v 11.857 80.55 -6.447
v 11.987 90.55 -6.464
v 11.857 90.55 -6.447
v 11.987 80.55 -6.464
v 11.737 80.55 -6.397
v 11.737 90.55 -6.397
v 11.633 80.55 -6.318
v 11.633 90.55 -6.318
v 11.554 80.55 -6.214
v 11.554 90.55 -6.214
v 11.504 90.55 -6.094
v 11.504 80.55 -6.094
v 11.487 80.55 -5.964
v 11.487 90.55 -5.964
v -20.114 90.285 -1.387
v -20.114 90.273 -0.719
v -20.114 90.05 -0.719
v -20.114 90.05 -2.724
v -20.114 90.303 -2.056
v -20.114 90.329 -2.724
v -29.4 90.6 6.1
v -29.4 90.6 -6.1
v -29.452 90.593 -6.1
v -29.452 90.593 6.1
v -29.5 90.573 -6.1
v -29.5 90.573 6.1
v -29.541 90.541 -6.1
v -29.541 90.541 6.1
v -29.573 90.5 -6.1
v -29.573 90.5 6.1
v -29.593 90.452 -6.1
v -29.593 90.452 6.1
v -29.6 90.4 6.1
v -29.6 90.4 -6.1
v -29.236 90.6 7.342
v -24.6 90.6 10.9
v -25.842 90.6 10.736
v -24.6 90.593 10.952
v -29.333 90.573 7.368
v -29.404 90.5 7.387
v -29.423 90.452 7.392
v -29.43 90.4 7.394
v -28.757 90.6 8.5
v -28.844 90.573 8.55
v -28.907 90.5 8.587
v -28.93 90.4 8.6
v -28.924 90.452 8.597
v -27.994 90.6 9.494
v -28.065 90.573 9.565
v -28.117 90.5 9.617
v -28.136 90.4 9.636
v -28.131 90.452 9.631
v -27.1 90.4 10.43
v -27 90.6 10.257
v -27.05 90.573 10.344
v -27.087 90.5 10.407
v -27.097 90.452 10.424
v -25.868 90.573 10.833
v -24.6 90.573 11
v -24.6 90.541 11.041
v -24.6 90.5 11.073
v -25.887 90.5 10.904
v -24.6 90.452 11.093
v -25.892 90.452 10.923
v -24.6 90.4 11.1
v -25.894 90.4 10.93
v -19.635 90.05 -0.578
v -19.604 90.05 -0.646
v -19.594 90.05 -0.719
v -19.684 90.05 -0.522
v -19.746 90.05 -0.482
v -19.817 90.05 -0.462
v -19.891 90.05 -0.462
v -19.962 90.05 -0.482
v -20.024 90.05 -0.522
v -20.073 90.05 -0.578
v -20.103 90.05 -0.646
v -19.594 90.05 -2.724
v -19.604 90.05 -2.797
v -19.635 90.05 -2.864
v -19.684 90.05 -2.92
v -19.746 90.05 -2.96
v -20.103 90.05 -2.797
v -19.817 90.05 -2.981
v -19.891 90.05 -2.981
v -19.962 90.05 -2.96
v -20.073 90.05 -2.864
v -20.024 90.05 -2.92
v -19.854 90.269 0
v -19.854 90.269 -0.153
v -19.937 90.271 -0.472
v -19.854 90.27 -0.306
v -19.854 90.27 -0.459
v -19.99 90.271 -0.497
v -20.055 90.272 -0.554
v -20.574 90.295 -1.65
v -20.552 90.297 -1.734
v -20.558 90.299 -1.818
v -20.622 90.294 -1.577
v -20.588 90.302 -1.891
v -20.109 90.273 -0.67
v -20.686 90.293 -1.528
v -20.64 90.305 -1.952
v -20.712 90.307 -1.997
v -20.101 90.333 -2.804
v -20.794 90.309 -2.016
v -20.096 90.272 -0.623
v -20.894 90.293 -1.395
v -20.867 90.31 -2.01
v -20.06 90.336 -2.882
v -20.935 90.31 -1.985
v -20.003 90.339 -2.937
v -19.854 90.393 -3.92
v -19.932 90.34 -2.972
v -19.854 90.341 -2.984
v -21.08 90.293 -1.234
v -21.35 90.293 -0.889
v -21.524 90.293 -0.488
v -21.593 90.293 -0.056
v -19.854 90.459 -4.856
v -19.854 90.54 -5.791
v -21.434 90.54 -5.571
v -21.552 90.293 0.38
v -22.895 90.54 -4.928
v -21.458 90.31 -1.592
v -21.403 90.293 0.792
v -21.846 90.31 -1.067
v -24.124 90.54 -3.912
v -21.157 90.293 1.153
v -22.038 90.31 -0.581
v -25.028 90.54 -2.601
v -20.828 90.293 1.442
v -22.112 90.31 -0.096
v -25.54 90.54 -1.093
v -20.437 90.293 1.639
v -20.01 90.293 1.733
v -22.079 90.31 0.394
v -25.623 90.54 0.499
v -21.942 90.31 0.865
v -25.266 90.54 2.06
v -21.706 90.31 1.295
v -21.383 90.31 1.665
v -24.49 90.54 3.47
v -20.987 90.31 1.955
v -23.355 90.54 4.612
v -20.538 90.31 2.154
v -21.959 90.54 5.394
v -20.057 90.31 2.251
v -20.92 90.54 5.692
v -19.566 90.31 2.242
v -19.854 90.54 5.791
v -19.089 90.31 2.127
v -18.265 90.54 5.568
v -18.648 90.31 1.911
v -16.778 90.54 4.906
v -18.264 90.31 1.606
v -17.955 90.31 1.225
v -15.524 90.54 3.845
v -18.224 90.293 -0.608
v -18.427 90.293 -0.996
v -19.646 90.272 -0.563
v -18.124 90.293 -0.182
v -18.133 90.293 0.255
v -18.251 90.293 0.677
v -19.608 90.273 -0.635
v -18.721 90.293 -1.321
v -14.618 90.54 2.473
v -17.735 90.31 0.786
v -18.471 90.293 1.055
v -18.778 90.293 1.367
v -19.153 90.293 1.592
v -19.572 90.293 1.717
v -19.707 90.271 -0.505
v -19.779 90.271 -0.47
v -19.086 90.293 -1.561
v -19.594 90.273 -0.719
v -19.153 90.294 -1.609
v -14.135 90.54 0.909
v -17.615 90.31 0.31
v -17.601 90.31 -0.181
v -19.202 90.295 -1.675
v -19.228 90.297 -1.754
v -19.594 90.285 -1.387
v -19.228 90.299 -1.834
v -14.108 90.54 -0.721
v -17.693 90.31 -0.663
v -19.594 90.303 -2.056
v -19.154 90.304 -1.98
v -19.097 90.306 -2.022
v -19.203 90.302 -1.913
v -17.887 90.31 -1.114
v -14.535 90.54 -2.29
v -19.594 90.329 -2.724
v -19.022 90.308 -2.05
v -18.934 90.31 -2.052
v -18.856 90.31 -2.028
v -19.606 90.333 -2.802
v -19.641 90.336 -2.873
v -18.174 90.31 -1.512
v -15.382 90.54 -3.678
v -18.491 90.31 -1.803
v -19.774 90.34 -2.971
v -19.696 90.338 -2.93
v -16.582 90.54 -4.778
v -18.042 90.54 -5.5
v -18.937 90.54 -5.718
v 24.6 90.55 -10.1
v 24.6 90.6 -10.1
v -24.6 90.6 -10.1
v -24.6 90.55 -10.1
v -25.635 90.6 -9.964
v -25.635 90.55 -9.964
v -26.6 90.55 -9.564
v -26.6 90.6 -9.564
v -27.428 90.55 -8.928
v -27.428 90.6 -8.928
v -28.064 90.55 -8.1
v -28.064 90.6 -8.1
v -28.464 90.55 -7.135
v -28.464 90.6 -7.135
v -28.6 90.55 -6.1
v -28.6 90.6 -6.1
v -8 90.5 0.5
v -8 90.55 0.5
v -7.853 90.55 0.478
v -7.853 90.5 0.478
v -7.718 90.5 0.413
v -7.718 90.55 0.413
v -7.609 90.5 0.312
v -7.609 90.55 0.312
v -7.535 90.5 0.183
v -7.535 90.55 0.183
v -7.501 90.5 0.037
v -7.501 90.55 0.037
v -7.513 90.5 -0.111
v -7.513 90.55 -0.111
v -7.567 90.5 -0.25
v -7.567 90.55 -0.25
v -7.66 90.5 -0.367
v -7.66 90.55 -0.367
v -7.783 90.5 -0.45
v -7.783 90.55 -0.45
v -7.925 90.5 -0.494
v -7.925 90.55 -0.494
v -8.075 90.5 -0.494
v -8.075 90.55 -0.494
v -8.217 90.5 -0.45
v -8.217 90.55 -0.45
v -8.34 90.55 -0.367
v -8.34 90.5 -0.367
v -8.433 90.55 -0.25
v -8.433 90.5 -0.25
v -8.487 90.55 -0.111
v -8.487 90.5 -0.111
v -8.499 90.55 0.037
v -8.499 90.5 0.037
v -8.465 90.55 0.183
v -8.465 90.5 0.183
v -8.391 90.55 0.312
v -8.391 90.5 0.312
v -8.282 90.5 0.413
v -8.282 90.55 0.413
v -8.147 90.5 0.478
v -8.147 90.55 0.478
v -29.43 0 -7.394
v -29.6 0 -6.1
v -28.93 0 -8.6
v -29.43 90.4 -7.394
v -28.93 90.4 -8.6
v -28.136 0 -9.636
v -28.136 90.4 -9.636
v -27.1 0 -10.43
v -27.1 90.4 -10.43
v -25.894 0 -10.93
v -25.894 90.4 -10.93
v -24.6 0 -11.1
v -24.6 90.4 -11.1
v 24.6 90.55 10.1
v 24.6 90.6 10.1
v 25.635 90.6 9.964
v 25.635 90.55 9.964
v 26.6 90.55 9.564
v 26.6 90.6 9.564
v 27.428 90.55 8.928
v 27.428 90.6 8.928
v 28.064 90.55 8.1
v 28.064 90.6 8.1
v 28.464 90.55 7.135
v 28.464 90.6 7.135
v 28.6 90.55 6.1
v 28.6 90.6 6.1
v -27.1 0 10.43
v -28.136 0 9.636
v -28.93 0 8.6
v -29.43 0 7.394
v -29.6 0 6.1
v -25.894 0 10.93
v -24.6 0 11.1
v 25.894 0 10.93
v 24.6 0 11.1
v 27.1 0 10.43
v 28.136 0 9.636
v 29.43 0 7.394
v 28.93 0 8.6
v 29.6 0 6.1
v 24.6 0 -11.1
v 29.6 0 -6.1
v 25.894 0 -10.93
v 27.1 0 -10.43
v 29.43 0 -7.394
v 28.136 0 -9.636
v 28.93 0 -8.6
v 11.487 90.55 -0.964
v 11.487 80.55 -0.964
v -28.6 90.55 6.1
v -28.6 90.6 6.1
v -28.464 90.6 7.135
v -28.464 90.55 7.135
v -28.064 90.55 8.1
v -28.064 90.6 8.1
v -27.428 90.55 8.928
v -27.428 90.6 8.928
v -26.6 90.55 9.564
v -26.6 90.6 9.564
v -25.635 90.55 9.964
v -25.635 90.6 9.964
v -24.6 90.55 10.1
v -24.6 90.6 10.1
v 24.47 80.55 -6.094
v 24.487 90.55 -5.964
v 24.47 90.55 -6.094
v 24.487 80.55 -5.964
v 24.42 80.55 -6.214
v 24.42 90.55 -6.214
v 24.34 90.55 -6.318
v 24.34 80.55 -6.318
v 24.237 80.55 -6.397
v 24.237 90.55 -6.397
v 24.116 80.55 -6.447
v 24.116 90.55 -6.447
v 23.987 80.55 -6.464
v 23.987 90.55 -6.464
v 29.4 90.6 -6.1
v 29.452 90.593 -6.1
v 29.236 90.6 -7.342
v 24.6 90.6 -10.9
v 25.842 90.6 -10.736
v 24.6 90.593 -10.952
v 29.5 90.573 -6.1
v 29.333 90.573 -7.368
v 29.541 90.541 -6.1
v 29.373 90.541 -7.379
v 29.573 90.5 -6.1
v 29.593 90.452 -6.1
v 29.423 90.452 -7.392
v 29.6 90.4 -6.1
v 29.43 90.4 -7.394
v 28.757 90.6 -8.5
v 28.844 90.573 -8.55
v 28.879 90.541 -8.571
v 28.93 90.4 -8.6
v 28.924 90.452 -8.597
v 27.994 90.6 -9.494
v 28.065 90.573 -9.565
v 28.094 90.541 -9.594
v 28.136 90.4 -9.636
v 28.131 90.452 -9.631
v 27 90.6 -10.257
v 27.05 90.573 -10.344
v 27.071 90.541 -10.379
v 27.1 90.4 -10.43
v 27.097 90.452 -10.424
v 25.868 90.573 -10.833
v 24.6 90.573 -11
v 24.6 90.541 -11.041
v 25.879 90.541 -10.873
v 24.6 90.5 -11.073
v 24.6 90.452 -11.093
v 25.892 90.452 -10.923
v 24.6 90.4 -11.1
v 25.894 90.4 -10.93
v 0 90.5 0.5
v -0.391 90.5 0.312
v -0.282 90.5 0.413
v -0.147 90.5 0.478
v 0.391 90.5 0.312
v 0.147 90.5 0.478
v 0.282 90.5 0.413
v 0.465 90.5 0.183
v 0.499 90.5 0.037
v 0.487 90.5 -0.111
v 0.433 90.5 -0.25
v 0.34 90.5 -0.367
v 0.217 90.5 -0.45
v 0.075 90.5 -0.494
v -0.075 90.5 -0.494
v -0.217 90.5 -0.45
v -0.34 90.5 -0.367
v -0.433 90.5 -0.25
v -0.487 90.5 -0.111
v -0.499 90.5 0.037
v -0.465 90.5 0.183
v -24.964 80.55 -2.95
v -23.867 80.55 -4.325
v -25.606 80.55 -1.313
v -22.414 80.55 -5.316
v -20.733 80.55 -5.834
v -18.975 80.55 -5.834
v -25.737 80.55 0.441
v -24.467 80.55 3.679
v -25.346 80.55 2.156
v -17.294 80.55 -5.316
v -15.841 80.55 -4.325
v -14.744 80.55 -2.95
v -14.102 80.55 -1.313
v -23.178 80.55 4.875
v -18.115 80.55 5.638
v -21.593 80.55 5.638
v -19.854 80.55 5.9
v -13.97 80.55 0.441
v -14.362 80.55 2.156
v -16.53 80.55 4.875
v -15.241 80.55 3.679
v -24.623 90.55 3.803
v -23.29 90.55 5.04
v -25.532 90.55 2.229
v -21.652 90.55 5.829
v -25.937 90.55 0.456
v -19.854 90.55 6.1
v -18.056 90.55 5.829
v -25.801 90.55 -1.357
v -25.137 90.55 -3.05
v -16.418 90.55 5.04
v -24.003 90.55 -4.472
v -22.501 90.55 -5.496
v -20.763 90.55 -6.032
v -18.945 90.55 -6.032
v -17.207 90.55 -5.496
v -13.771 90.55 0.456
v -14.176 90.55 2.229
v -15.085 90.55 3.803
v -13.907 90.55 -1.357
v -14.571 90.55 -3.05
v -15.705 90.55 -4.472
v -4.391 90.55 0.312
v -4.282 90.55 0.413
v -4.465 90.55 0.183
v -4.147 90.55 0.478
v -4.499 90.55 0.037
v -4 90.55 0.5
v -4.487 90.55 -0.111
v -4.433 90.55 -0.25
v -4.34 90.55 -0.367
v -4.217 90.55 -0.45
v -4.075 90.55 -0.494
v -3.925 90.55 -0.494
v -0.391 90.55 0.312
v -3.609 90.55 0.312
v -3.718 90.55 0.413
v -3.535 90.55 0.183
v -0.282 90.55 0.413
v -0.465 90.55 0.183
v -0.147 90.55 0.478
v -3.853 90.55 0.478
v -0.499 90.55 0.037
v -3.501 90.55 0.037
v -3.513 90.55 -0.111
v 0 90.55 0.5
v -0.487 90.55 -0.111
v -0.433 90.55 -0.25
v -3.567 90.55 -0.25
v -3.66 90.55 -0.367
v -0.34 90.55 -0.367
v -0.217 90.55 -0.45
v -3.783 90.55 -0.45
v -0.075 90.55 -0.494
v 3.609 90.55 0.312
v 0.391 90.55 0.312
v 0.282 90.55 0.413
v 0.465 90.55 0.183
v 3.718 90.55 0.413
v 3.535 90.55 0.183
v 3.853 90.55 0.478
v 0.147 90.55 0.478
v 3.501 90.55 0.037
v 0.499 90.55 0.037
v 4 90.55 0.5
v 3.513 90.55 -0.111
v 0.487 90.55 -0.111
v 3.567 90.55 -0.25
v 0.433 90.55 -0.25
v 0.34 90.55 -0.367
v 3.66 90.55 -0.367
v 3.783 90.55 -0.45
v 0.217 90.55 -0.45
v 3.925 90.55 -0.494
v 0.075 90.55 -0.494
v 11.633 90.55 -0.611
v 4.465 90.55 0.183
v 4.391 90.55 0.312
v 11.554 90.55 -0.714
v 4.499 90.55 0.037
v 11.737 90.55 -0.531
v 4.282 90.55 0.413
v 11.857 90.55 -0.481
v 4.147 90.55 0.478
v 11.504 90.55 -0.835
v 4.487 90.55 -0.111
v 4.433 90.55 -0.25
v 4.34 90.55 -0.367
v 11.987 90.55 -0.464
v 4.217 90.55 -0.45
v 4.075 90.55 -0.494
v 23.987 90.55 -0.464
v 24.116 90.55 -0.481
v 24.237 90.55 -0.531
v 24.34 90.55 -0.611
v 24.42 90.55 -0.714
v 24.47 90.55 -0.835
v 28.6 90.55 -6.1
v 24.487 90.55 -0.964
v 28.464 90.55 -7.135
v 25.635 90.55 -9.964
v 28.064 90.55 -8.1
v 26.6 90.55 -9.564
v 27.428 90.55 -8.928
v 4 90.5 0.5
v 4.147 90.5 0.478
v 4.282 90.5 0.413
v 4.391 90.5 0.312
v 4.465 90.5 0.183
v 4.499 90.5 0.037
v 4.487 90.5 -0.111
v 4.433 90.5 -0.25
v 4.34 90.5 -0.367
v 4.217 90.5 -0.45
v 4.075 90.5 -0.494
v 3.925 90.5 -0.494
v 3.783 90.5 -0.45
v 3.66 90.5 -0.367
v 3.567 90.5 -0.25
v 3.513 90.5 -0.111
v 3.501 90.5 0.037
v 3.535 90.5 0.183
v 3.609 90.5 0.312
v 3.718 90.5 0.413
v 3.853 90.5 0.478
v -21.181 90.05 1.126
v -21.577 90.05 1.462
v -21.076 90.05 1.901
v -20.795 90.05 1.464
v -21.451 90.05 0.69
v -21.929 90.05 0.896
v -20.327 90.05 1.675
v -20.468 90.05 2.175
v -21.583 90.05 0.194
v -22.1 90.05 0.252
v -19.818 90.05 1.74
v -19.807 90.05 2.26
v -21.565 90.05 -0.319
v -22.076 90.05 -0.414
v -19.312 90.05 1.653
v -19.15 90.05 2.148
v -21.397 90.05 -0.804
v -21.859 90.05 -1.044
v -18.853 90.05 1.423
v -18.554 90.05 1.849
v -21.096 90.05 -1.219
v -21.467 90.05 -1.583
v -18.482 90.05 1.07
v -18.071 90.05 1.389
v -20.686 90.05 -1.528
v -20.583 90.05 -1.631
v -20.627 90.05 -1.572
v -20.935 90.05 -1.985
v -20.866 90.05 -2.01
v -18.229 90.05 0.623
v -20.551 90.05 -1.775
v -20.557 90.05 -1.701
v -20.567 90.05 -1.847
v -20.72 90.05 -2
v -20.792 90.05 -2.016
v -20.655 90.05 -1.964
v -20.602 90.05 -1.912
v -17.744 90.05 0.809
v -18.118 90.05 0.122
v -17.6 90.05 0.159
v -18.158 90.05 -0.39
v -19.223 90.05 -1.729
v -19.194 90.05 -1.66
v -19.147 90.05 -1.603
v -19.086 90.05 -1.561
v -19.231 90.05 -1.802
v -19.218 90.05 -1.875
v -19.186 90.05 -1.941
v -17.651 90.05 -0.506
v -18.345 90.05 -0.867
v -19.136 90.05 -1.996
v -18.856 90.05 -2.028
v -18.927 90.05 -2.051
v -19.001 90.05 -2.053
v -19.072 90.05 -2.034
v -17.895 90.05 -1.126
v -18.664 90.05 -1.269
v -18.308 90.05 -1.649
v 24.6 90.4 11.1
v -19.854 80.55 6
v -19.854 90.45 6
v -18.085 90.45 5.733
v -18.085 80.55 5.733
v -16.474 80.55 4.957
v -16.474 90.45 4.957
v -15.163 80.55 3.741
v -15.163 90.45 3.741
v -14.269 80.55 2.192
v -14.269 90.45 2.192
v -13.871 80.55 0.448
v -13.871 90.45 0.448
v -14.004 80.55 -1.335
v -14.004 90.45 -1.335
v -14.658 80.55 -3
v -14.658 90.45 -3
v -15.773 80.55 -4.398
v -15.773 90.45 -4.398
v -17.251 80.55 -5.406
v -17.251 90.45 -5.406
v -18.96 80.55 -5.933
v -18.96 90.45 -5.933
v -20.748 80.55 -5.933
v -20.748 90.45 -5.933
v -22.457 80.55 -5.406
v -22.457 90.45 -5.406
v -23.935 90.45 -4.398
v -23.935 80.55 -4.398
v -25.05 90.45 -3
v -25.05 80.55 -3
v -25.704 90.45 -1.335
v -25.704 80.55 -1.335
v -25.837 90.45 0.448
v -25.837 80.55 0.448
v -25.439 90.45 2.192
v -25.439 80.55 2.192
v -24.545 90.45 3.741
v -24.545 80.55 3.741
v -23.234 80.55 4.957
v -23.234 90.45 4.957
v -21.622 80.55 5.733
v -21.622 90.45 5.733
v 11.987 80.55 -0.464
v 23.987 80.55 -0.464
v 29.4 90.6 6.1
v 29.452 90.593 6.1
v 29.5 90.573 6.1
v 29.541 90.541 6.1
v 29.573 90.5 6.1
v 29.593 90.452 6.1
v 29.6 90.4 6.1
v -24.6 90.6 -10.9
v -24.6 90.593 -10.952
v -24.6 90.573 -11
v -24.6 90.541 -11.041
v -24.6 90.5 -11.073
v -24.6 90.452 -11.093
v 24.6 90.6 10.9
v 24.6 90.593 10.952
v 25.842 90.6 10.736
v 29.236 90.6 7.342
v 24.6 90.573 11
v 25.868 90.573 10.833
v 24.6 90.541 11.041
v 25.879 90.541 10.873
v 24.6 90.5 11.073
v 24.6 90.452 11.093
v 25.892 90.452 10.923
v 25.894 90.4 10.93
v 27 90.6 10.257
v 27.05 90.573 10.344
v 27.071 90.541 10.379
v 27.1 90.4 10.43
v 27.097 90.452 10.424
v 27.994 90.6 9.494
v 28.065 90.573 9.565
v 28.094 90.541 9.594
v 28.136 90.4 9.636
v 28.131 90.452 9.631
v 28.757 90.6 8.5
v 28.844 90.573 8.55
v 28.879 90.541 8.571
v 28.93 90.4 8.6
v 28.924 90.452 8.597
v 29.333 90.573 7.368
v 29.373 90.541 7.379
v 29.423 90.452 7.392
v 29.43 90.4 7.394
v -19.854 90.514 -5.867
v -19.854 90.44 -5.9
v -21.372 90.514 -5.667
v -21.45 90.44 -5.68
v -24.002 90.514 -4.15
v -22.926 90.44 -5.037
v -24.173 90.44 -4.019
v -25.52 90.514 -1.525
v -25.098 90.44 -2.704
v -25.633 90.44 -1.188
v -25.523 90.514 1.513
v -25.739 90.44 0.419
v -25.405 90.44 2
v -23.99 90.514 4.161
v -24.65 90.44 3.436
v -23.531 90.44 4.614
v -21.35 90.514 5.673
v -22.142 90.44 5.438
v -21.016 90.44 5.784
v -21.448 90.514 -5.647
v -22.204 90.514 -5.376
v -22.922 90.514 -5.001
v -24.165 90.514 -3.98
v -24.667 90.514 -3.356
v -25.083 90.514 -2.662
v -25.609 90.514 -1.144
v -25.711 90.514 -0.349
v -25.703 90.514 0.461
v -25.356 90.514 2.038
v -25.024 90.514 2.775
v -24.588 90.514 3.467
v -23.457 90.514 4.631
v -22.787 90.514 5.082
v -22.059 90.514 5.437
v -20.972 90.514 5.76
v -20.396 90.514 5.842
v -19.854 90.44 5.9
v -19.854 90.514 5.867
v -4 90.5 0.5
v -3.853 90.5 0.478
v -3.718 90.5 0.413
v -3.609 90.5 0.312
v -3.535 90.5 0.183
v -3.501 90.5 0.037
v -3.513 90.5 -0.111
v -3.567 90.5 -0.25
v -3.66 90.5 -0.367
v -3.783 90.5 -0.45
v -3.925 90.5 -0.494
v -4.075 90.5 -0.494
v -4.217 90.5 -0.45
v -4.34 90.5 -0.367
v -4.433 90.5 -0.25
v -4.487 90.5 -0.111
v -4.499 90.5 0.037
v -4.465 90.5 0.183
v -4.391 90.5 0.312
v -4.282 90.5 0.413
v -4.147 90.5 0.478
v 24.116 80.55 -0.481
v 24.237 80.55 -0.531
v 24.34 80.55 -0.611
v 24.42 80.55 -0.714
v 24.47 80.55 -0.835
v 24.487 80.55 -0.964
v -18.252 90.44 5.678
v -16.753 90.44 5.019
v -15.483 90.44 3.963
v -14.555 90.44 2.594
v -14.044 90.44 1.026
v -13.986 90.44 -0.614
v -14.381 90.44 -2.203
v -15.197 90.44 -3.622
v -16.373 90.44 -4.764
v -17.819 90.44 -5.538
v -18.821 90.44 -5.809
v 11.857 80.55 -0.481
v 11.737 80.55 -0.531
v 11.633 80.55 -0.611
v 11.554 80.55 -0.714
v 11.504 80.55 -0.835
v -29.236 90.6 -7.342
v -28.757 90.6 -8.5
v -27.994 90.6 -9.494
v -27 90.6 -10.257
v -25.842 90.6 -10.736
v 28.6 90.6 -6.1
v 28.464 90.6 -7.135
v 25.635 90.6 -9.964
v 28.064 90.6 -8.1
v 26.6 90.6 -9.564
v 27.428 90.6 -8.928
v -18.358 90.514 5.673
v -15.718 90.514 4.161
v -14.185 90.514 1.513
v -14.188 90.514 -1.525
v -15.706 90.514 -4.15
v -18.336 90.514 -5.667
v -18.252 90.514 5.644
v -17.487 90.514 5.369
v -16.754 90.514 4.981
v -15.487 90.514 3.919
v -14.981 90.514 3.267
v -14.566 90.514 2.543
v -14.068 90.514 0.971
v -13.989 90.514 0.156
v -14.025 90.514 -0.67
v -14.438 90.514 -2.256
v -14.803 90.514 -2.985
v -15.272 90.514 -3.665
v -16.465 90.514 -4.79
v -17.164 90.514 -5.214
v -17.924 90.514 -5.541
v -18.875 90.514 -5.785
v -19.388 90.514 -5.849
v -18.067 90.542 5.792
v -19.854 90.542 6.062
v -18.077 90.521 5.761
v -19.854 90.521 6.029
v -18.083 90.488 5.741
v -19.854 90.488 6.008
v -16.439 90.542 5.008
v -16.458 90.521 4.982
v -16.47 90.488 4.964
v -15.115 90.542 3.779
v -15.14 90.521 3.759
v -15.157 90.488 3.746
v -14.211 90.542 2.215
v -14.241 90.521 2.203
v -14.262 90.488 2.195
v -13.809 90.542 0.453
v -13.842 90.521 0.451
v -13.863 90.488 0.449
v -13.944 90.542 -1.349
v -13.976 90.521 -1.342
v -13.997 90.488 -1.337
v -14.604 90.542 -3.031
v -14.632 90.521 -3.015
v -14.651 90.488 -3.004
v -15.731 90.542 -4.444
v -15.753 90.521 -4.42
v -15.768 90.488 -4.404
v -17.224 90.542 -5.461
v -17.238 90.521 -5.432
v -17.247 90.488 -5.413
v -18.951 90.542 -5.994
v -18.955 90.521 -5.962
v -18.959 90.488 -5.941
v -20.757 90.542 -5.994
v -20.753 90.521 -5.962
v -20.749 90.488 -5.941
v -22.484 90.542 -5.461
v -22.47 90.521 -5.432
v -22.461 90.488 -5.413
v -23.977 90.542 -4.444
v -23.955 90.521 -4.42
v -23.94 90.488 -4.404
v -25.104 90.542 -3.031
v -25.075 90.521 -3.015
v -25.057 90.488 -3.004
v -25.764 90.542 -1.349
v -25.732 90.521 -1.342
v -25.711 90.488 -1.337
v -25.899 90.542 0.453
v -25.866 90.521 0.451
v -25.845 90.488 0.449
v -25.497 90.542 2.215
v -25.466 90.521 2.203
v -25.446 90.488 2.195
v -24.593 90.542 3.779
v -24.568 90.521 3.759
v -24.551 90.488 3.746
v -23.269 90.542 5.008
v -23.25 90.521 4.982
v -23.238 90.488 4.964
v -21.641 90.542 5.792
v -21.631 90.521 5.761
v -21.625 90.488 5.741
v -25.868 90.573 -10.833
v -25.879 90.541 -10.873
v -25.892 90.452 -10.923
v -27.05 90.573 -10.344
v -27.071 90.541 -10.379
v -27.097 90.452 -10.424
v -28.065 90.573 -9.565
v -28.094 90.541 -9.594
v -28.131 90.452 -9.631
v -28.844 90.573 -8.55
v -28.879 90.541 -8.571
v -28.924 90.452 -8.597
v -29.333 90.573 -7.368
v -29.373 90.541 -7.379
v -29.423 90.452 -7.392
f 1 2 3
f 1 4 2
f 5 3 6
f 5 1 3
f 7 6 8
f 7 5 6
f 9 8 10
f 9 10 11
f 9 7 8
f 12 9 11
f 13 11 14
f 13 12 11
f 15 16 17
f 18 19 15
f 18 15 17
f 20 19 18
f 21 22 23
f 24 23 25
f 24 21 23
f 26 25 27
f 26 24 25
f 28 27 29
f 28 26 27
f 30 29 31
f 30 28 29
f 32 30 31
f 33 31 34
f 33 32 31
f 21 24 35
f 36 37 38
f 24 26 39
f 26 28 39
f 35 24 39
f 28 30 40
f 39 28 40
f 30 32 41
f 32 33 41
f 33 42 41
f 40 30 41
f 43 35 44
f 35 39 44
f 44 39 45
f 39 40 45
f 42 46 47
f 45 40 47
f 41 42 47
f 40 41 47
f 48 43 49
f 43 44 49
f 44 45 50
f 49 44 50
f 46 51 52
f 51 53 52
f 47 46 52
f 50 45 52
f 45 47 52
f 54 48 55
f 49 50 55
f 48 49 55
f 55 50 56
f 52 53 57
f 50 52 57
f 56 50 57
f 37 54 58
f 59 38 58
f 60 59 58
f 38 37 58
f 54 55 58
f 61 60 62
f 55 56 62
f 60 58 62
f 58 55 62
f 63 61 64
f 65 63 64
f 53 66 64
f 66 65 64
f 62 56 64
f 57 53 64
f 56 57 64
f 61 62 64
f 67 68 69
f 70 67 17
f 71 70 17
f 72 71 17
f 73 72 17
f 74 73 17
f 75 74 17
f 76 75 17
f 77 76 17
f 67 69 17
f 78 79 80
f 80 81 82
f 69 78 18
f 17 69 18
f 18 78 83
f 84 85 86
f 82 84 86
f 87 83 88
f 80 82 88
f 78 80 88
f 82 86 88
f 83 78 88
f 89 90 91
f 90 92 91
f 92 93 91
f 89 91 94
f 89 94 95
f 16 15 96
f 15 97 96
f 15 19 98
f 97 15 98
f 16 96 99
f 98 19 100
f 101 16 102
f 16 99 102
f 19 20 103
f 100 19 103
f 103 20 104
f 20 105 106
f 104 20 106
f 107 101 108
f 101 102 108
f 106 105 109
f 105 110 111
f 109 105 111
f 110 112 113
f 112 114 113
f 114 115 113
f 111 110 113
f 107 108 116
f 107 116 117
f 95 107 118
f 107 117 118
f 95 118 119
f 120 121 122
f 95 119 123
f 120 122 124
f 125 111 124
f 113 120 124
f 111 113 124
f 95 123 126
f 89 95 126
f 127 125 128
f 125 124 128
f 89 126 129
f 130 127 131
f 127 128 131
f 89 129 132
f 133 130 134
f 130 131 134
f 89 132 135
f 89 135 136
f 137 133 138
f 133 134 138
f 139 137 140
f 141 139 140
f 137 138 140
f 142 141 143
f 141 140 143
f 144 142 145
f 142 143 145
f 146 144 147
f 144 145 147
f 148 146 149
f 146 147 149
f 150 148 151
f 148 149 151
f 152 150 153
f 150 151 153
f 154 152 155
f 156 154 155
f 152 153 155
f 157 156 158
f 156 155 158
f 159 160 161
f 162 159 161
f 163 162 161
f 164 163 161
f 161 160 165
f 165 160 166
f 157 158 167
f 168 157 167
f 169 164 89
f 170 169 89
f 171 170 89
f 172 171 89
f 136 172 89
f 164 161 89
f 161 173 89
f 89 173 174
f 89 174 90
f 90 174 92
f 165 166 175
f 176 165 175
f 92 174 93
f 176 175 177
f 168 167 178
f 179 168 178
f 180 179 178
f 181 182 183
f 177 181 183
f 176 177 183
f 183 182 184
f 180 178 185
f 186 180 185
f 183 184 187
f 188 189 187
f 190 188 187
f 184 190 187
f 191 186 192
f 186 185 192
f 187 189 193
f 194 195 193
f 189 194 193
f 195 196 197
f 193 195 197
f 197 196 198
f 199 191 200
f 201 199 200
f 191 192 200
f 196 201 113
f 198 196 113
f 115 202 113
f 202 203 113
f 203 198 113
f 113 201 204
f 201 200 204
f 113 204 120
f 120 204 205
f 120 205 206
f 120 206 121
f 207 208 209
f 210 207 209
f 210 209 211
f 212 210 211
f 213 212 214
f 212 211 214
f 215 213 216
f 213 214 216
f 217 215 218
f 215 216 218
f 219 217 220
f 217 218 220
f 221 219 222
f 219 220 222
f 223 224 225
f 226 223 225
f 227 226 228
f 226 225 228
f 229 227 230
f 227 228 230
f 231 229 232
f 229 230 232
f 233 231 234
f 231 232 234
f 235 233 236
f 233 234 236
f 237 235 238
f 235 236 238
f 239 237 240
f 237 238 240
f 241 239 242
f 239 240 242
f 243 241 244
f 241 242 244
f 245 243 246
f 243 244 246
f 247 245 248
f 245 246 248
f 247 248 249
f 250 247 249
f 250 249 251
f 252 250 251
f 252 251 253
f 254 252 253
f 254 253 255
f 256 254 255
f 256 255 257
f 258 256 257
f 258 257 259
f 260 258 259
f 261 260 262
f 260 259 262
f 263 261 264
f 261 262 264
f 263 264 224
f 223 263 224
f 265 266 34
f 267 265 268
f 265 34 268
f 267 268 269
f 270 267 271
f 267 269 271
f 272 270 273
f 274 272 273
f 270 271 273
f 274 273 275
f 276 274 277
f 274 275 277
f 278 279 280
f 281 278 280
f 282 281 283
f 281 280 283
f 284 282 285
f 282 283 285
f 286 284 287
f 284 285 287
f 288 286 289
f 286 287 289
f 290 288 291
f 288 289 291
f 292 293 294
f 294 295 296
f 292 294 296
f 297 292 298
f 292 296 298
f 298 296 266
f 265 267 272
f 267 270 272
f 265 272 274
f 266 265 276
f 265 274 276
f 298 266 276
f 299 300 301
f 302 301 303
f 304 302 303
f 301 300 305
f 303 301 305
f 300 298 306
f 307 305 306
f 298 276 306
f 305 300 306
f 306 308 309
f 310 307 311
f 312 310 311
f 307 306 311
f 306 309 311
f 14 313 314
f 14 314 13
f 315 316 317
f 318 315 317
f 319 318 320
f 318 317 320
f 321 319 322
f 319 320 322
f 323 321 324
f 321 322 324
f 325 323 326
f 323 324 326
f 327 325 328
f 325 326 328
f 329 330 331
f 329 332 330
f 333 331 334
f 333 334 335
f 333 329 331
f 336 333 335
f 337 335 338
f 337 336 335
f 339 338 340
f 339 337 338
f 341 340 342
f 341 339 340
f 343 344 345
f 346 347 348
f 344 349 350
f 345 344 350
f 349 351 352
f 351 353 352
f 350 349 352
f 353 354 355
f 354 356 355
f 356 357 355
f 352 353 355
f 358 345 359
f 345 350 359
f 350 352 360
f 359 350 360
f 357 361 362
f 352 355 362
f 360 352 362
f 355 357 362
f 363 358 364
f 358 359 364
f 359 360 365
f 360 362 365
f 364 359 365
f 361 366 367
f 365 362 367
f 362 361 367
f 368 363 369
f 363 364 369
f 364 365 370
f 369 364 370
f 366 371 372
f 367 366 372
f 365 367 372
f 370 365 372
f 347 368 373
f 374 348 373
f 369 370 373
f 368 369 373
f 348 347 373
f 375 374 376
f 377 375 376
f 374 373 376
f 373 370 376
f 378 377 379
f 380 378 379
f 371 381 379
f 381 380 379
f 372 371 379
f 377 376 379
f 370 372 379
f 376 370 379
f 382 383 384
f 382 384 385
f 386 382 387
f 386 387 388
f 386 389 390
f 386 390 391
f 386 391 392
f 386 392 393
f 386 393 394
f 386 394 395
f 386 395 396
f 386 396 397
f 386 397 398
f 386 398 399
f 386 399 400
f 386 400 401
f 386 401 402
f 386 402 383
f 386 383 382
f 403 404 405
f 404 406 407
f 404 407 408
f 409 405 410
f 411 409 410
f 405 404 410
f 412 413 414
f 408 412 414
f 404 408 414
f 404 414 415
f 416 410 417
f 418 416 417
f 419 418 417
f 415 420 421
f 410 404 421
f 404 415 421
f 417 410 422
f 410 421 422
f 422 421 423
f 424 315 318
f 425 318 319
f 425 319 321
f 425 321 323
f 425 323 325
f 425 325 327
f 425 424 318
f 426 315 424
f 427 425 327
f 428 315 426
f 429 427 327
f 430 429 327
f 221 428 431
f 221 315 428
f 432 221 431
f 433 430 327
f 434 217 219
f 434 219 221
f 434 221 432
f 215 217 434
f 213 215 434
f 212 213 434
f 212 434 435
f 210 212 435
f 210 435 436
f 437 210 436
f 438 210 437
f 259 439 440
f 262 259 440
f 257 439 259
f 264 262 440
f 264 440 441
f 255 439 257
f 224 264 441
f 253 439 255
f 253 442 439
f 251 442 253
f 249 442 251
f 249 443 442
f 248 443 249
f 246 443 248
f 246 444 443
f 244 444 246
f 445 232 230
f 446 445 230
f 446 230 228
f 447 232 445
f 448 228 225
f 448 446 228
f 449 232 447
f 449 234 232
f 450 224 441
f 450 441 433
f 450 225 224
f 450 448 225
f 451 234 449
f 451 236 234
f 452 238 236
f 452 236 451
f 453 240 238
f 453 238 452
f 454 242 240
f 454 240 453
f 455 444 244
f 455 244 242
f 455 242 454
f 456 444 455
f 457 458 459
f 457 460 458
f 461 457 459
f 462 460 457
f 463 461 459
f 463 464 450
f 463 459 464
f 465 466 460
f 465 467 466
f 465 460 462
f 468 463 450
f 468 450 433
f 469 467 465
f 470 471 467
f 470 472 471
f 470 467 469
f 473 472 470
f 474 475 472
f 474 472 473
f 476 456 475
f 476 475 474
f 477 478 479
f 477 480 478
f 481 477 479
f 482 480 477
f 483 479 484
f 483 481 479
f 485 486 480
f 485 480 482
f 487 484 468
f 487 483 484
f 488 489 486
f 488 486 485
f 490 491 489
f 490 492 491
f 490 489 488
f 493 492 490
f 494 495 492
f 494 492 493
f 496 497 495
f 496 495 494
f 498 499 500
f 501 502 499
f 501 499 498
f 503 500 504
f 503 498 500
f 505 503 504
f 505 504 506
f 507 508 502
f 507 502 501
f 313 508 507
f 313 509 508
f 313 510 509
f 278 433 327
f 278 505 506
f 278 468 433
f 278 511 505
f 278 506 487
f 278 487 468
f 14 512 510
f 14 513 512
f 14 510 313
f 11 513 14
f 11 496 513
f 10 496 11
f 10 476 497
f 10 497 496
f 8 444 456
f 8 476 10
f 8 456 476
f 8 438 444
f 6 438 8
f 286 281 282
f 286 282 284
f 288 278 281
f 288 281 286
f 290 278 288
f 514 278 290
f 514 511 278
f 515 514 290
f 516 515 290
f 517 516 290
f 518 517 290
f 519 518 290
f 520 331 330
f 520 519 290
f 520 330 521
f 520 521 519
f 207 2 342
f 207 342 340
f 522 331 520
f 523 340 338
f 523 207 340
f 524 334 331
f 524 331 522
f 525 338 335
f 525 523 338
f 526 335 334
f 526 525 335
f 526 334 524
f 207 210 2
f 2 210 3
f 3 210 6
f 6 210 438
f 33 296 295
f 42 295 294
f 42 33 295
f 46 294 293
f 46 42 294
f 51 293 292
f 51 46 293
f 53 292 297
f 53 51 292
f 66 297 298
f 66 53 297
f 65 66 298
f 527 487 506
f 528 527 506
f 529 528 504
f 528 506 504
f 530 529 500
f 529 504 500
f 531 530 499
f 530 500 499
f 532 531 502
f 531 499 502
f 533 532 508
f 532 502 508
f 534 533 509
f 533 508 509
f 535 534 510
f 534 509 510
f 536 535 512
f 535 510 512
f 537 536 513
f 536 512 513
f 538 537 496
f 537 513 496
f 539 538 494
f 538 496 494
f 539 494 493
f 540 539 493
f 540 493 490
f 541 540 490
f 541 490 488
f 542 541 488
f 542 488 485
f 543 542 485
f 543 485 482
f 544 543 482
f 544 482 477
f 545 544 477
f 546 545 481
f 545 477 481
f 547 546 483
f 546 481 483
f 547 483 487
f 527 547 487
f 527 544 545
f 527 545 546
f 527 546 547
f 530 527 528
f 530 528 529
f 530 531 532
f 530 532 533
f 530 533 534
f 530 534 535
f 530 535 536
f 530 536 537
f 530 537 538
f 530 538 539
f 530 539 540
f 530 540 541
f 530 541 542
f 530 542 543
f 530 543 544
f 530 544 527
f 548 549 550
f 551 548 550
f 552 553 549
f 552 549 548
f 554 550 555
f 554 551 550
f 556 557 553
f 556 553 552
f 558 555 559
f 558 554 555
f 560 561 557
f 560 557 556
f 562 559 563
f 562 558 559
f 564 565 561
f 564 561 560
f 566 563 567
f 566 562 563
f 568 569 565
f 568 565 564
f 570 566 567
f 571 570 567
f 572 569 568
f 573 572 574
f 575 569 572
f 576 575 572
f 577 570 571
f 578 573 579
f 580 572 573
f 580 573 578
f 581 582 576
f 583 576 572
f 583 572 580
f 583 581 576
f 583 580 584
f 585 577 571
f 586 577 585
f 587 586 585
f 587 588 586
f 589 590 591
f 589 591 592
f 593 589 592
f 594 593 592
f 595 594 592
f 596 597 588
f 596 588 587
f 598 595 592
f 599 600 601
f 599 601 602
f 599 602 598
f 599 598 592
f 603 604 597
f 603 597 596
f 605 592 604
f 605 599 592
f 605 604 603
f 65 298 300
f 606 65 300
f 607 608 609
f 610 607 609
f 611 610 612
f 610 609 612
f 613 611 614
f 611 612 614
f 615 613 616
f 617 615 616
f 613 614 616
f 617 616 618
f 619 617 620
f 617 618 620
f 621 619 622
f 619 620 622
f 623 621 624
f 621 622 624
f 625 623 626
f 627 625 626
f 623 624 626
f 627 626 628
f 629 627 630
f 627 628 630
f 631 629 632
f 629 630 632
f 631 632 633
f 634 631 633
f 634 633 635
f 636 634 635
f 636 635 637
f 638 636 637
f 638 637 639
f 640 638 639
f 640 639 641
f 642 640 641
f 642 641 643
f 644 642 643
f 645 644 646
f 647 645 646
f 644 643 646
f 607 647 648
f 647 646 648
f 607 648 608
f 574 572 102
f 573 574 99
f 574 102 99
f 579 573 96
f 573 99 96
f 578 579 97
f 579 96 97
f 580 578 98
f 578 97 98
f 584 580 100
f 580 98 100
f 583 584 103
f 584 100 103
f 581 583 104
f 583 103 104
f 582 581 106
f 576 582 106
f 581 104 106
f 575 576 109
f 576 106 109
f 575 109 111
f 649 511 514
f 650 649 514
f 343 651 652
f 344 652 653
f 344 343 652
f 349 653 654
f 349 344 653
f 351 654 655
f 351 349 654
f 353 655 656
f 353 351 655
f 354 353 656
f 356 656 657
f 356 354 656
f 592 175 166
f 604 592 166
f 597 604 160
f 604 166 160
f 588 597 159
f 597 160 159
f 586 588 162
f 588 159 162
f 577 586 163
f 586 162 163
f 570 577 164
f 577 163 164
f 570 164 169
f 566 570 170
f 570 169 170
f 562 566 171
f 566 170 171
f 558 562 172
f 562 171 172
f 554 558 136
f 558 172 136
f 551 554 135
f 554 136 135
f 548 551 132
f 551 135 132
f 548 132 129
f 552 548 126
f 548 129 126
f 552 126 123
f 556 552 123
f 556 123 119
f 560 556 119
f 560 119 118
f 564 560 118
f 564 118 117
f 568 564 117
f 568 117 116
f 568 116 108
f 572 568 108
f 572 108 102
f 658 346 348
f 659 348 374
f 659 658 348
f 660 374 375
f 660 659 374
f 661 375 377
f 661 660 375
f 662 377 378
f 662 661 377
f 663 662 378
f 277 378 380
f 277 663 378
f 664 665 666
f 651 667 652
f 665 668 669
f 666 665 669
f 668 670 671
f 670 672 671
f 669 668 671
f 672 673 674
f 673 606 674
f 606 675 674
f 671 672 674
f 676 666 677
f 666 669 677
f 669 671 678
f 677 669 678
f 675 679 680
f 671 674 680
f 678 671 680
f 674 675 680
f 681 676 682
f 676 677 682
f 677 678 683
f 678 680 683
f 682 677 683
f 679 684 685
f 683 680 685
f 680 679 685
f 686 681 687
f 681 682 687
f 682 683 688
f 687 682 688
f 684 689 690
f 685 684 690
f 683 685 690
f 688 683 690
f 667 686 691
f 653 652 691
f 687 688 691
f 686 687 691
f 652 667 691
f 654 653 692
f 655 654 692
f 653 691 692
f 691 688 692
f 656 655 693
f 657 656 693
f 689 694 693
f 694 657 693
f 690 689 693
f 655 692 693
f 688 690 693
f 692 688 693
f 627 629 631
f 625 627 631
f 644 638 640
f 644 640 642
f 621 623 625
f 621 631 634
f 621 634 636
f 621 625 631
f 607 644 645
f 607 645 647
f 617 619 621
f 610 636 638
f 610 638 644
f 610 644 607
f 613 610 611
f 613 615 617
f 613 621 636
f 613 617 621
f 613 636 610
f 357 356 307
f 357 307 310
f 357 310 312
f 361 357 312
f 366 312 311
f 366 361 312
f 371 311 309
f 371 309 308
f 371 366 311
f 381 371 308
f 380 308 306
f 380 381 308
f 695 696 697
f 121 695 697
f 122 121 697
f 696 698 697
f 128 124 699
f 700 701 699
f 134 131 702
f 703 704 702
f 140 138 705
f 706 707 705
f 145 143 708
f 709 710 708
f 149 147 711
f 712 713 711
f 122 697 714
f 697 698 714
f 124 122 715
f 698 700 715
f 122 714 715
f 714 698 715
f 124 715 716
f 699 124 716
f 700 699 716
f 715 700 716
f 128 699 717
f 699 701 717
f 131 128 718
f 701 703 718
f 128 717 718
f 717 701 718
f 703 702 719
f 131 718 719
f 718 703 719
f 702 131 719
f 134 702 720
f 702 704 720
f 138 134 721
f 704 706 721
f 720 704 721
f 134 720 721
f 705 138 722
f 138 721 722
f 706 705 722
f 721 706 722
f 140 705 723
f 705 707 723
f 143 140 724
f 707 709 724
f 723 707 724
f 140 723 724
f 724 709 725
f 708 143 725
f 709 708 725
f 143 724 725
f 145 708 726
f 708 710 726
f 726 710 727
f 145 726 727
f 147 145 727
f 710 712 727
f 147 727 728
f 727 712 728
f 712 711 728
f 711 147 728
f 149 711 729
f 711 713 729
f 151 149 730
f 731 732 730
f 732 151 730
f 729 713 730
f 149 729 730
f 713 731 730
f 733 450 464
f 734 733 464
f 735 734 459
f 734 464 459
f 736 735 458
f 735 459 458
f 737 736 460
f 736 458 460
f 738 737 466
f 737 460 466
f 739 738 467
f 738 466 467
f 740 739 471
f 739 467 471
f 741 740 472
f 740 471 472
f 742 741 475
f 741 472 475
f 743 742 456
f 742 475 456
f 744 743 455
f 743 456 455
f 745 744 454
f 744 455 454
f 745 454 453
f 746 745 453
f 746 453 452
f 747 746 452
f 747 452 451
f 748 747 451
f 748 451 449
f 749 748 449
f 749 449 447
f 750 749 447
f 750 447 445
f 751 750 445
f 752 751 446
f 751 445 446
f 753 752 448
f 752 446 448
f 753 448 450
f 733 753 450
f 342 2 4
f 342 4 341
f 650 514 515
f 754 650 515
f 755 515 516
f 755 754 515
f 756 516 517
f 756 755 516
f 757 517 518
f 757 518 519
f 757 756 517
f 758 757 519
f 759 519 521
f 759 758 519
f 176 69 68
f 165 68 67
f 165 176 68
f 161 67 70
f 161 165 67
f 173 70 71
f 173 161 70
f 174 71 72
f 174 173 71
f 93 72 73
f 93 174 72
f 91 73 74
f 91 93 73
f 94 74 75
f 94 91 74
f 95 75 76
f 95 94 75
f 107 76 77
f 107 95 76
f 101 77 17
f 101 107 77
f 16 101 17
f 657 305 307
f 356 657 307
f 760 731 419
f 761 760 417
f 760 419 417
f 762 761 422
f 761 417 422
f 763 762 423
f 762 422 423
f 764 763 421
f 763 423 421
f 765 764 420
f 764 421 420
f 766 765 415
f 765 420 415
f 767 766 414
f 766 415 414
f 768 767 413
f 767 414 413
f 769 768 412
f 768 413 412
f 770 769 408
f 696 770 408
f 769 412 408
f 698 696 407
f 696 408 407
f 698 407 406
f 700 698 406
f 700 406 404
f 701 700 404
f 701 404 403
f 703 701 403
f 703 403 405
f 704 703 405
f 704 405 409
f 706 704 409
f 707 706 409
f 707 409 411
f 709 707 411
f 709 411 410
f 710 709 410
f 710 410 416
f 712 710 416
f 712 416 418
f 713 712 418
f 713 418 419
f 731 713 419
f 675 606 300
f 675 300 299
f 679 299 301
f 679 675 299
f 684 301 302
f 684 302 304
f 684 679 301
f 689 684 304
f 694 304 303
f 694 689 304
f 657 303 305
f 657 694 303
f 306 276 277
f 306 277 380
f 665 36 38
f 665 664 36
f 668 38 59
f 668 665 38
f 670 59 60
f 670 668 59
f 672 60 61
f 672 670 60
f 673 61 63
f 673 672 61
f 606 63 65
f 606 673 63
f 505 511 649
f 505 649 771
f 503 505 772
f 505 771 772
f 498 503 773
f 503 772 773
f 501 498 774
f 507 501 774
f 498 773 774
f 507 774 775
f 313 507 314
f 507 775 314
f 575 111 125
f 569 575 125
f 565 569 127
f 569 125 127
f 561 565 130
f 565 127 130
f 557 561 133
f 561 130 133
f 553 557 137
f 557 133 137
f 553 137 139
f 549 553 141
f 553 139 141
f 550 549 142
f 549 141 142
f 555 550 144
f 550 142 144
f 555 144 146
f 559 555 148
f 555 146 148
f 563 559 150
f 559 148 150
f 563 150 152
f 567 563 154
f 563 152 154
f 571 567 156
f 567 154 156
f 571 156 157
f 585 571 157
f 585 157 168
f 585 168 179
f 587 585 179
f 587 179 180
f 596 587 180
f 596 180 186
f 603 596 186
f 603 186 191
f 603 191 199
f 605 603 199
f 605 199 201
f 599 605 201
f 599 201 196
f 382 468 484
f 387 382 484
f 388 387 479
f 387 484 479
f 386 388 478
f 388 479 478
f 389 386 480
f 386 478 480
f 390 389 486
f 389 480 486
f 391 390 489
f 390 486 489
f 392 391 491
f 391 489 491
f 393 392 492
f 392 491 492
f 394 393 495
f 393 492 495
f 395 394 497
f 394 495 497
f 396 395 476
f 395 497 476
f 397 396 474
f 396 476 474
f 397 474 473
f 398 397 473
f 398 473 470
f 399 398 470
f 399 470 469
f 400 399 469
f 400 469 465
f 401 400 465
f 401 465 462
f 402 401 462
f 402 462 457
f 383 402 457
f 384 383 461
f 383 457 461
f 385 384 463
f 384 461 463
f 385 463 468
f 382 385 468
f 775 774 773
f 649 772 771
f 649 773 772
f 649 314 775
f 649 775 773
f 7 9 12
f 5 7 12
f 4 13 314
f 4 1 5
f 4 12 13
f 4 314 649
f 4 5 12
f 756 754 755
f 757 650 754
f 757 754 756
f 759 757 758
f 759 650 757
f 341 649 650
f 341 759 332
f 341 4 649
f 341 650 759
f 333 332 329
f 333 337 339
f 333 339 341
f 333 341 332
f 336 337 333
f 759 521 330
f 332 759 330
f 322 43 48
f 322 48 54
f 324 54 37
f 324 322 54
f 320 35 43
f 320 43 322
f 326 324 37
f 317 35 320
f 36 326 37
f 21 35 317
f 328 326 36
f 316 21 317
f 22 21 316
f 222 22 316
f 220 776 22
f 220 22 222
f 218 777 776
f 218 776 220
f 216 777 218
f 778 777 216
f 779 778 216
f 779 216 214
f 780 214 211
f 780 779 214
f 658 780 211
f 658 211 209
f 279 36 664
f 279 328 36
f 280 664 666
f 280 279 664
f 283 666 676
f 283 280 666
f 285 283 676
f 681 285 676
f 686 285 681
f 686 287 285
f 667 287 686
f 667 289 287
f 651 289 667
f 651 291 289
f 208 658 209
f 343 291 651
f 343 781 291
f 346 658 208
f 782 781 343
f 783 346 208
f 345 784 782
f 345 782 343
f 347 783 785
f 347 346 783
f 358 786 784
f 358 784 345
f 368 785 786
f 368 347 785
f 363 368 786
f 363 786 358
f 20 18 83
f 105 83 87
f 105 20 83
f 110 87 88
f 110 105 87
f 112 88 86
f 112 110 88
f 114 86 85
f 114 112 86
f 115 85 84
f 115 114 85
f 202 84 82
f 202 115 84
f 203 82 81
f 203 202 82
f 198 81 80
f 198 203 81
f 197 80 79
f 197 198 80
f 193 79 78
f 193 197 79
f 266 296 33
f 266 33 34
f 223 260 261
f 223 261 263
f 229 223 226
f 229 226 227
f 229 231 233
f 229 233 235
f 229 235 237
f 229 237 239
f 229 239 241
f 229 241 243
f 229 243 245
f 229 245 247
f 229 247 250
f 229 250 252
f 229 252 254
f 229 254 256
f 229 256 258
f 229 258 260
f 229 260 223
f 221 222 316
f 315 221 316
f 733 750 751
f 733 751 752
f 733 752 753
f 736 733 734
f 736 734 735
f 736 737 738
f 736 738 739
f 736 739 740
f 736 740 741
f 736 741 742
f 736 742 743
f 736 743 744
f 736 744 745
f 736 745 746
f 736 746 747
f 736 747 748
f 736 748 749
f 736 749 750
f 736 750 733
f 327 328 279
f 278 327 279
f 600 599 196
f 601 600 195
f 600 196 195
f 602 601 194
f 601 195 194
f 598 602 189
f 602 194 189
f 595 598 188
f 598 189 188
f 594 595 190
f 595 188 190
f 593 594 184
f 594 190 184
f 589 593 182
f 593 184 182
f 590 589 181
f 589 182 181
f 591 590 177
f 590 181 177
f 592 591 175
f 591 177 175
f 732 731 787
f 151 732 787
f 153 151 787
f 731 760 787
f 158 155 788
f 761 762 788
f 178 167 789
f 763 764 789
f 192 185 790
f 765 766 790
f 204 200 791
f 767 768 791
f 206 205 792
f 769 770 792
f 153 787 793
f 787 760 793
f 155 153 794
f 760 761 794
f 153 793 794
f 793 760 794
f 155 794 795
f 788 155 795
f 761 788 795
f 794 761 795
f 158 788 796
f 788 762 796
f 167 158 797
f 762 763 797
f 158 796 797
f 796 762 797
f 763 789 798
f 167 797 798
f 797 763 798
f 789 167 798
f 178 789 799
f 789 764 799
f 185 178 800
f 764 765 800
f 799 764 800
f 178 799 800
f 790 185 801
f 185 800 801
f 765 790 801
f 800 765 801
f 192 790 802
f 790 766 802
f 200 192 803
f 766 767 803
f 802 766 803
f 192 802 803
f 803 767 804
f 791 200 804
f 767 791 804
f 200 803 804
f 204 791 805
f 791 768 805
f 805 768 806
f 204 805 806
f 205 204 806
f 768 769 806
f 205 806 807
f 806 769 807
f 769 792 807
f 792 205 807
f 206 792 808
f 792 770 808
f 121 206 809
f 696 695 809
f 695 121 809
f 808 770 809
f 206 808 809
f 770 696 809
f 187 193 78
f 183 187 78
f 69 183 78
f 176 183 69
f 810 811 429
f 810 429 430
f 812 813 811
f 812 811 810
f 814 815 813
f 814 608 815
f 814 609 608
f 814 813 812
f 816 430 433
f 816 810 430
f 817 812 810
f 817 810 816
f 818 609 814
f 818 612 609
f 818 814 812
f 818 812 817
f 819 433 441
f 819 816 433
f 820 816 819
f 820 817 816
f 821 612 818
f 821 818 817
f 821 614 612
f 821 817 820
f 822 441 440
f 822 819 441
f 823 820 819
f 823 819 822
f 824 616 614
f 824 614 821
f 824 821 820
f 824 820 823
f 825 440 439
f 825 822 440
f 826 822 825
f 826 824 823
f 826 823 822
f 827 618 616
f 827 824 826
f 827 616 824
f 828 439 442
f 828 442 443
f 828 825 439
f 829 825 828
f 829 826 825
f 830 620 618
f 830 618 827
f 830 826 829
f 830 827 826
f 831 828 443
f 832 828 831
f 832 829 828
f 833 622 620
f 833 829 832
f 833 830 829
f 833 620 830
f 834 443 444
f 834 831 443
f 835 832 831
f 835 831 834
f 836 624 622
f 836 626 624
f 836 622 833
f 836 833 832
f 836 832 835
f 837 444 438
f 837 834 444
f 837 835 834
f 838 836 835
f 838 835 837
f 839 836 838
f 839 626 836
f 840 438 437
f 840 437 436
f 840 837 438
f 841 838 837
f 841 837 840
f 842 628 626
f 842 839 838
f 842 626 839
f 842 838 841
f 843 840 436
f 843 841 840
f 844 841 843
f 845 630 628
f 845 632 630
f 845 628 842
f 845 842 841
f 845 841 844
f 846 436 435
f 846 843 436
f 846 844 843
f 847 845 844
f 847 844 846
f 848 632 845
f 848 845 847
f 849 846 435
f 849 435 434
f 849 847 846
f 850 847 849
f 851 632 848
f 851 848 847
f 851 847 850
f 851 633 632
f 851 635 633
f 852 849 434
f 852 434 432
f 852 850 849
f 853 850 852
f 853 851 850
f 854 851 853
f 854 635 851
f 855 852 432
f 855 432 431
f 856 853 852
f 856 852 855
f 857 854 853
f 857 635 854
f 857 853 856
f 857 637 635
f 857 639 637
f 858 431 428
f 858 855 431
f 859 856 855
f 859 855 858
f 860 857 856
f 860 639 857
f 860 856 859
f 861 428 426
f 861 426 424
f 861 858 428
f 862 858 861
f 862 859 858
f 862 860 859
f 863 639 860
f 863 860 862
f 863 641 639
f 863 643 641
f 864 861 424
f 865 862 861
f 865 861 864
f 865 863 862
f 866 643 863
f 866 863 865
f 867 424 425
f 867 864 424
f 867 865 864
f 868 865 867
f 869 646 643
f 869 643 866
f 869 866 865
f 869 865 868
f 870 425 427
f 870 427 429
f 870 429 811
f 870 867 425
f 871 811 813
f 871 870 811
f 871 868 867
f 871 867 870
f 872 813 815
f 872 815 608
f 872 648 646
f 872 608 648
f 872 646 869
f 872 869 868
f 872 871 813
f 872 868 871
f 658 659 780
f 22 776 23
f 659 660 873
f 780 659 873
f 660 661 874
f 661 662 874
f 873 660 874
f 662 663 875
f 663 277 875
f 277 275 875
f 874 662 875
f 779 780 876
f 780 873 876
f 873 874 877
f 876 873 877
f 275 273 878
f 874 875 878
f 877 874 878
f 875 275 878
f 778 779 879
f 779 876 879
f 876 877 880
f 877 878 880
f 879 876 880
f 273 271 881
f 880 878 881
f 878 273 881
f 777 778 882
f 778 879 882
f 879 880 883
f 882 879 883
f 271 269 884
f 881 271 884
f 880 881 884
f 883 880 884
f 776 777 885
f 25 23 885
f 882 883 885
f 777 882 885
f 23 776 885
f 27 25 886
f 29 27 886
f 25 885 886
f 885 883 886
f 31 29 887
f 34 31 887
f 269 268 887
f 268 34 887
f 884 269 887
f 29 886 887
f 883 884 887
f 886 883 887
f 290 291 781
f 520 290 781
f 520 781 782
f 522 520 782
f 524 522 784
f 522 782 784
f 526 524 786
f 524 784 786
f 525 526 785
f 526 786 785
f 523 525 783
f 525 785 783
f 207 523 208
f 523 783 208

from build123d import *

# Parameters (mm, degrees)
SKETCH1_W      = 59.2
SKETCH1_H      = 22.2
EXTRUDE1_DEPTH = 90.6
FILLET1_R      = 5
EXTRUDE2_DEPTH = 0.05
SKETCH3_R      = 6
EXTRUDE3_DEPTH = 10
SKETCH4_R      = 5.9
EXTRUDE4_DEPTH = 10
FILLET2_R      = 0.1
FILLET3_R      = 0.1
SKETCH6_R      = 0.5
EXTRUDE5_DEPTH = 0.05
EXTRUDE8_DEPTH = 0.5
FILLET4_R      = 0.2
SKETCH8_W      = 13
SKETCH8_H      = 6
EXTRUDE9_DEPTH = 10
FILLET5_R      = 0.5


with BuildPart() as part:
    # Sketch1 → Extrude1 (new body)
    with BuildSketch(Plane(origin=(0, 0, 0), x_dir=(1, 0, 0), z_dir=(0, 1, 0))):
        Rectangle(SKETCH1_W, SKETCH1_H)
    extrude(amount=EXTRUDE1_DEPTH)

    # Fillet1
    fillet1_edges = [part.edges().sort_by_distance(p)[0] for p in [
        (29.6, 45.3, 11.1),
        (-29.6, 45.3, 11.1),
        (-29.6, 45.3, -11.1),
        (29.6, 45.3, -11.1),
    ]]
    fillet(fillet1_edges, radius=FILLET1_R)

    # Sketch2 → Extrude2 (cut)
    with BuildSketch(Plane(origin=(0, 90.6, 0), x_dir=(1, 0, 0), z_dir=(0, 1, 0))):
        with BuildLine():
            Line((-28.6, 6.1), (-28.6, -6.1))
            ThreePointArc((-28.6, -6.1), (-27.428427125, -8.928427125), (-24.6, -10.1))
            Line((-24.6, -10.1), (24.6, -10.1))
            ThreePointArc((24.6, -10.1), (27.428427125, -8.928427125), (28.6, -6.1))
            Line((28.6, -6.1), (28.6, 6.1))
            ThreePointArc((28.6, 6.1), (27.428427125, 8.928427125), (24.6, 10.1))
            Line((24.6, 10.1), (-24.6, 10.1))
            ThreePointArc((-24.6, 10.1), (-27.428427125, 8.928427125), (-28.6, 6.1))
        make_face()
    extrude(amount=-EXTRUDE2_DEPTH, mode=Mode.SUBTRACT)

    # Sketch3 → Extrude3 (cut)
    with BuildSketch(Plane(origin=(0, 90.55, 0), x_dir=(1, 0, 0), z_dir=(0, 1, 0))):
        with Locations(Location((-19.853967115, 0, 0), (0, 0, 270))):
            Circle(SKETCH3_R)
    extrude(amount=-EXTRUDE3_DEPTH, mode=Mode.SUBTRACT)

    # Fillet3
    fillet3_edges = [part.edges().sort_by_distance(p)[0] for p in [
        (-19.853967115, 90.55, -6),
    ]]
    fillet(fillet3_edges, radius=FILLET3_R)

    # Sketch6 → Extrude5 (cut)
    with BuildSketch(Plane(origin=(0, 90.55, 0), x_dir=(1, 0, 0), z_dir=(0, 1, 0))):
        with Locations(Location((-8, 0, 0), (0, 0, 270))):
            Circle(SKETCH6_R)
        with Locations(Location((-4, 0, 0), (0, 0, 270))):
            Circle(SKETCH6_R)
        with Locations(Location((0, 0, 0), (0, 0, 270))):
            Circle(SKETCH6_R)
        with Locations(Location((4, 0, 0), (0, 0, 270))):
            Circle(SKETCH6_R)
    extrude(amount=-EXTRUDE5_DEPTH, mode=Mode.SUBTRACT)

    # Fillet4
    fillet4_edges = [part.edges().sort_by_distance(p)[0] for p in [
        (0, 90.6, 11.1),
        (-29.6, 90.6, 0),
        (29.6, 90.6, 0),
        (0, 90.6, -11.1),
        (28.135533906, 90.6, 9.635533906),
        (28.135533906, 90.6, -9.635533906),
        (-28.135533906, 90.6, -9.635533906),
        (-28.135533906, 90.6, 9.635533906),
    ]]
    fillet(fillet4_edges, radius=FILLET4_R)

    # Sketch8 → Extrude9 (cut)
    with BuildSketch(Plane(origin=(0, 90.55, 0), x_dir=(1, 0, 0), z_dir=(0, 1, 0))):
        with Locations((17.986901839, 3.464293514)):
            Rectangle(SKETCH8_W, SKETCH8_H)
    extrude(amount=-EXTRUDE9_DEPTH, mode=Mode.SUBTRACT)

    # Fillet5
    fillet5_edges = [part.edges().sort_by_distance(p)[0] for p in [
        (11.486901839, 85.55, -0.464293514),
        (11.486901839, 85.55, -6.464293514),
        (24.486901839, 85.55, -6.464293514),
        (24.486901839, 85.55, -0.464293514),
    ]]
    fillet(fillet5_edges, radius=FILLET5_R)


with BuildPart() as body_2:
    # Sketch4 → Extrude4 (new body)
    with BuildSketch(Plane(origin=(0, 80.55, 0), x_dir=(1, 0, 0), z_dir=(0, 1, 0))):
        with Locations(Location((-19.853967115, 0, 0), (0, 0, 270))):
            Circle(SKETCH4_R)
    extrude(amount=EXTRUDE4_DEPTH)

    # Sketch5 → Cut-Revolve1 (revolve, cut)
    with BuildSketch(Plane.XY, mode=Mode.PRIVATE) as cut_revolve1_sk:
        with BuildLine():
            Line((-25.753967115, 90.55), (-19.853967115, 90.55))
            Line((-19.853967115, 90.55), (-19.853967115, 90.268787223))
            ThreePointArc((-19.853967115, 90.268787223), (-22.807316088, 90.3391303), (-25.753967115, 90.55))
        make_face()
    revolve(cut_revolve1_sk.sketch.rotate(Axis((-19.853967115, 80.55, 0), (0, 1, 0)), 270), axis=Axis((-19.853967115, 80.55, 0), (0, 1, 0)), mode=Mode.SUBTRACT)

    # Fillet2
    fillet2_edges = [body_2.edges().sort_by_distance(p)[0] for p in [
        (-25.753967115, 90.55, 0),
    ]]
    fillet(fillet2_edges, radius=FILLET2_R)

    # Sketch7 → Extrude8 (cut)
    with BuildSketch(Plane(origin=(0, 90.55, 0), x_dir=(1, 0, 0), z_dir=(0, 1, 0))):
        with BuildLine():
            Line((-20.113967115, 0.718981633), (-20.113967115, 2.723866666))
            ThreePointArc((-20.113967115, 2.723866666), (-19.853967115, 2.983866666), (-19.593967115, 2.723866666))
            Line((-19.593967115, 2.723866666), (-19.593967115, 0.718981633))
            ThreePointArc((-19.593967115, 0.718981633), (-19.853967115, 0.458981633), (-20.113967115, 0.718981633))
        make_face()
        with BuildLine():
            ThreePointArc((-20.935149799, 1.984601724), (-19.806891698, -2.25950966), (-18.856382539, 2.02791149))
            ThreePointArc((-18.856382539, 2.02791149), (-19.204448458, 1.909378306), (-19.085915273, 1.561312386))
            ThreePointArc((-19.085915273, 1.561312386), (-19.81772321, -1.739622482), (-20.686382102, 1.527967699))
            ThreePointArc((-20.686382102, 1.527967699), (-20.582448938, 1.88066856), (-20.935149799, 1.984601724))
        make_face()
    extrude(amount=-EXTRUDE8_DEPTH, mode=Mode.SUBTRACT)


solid = Compound([part.part, body_2.part])
